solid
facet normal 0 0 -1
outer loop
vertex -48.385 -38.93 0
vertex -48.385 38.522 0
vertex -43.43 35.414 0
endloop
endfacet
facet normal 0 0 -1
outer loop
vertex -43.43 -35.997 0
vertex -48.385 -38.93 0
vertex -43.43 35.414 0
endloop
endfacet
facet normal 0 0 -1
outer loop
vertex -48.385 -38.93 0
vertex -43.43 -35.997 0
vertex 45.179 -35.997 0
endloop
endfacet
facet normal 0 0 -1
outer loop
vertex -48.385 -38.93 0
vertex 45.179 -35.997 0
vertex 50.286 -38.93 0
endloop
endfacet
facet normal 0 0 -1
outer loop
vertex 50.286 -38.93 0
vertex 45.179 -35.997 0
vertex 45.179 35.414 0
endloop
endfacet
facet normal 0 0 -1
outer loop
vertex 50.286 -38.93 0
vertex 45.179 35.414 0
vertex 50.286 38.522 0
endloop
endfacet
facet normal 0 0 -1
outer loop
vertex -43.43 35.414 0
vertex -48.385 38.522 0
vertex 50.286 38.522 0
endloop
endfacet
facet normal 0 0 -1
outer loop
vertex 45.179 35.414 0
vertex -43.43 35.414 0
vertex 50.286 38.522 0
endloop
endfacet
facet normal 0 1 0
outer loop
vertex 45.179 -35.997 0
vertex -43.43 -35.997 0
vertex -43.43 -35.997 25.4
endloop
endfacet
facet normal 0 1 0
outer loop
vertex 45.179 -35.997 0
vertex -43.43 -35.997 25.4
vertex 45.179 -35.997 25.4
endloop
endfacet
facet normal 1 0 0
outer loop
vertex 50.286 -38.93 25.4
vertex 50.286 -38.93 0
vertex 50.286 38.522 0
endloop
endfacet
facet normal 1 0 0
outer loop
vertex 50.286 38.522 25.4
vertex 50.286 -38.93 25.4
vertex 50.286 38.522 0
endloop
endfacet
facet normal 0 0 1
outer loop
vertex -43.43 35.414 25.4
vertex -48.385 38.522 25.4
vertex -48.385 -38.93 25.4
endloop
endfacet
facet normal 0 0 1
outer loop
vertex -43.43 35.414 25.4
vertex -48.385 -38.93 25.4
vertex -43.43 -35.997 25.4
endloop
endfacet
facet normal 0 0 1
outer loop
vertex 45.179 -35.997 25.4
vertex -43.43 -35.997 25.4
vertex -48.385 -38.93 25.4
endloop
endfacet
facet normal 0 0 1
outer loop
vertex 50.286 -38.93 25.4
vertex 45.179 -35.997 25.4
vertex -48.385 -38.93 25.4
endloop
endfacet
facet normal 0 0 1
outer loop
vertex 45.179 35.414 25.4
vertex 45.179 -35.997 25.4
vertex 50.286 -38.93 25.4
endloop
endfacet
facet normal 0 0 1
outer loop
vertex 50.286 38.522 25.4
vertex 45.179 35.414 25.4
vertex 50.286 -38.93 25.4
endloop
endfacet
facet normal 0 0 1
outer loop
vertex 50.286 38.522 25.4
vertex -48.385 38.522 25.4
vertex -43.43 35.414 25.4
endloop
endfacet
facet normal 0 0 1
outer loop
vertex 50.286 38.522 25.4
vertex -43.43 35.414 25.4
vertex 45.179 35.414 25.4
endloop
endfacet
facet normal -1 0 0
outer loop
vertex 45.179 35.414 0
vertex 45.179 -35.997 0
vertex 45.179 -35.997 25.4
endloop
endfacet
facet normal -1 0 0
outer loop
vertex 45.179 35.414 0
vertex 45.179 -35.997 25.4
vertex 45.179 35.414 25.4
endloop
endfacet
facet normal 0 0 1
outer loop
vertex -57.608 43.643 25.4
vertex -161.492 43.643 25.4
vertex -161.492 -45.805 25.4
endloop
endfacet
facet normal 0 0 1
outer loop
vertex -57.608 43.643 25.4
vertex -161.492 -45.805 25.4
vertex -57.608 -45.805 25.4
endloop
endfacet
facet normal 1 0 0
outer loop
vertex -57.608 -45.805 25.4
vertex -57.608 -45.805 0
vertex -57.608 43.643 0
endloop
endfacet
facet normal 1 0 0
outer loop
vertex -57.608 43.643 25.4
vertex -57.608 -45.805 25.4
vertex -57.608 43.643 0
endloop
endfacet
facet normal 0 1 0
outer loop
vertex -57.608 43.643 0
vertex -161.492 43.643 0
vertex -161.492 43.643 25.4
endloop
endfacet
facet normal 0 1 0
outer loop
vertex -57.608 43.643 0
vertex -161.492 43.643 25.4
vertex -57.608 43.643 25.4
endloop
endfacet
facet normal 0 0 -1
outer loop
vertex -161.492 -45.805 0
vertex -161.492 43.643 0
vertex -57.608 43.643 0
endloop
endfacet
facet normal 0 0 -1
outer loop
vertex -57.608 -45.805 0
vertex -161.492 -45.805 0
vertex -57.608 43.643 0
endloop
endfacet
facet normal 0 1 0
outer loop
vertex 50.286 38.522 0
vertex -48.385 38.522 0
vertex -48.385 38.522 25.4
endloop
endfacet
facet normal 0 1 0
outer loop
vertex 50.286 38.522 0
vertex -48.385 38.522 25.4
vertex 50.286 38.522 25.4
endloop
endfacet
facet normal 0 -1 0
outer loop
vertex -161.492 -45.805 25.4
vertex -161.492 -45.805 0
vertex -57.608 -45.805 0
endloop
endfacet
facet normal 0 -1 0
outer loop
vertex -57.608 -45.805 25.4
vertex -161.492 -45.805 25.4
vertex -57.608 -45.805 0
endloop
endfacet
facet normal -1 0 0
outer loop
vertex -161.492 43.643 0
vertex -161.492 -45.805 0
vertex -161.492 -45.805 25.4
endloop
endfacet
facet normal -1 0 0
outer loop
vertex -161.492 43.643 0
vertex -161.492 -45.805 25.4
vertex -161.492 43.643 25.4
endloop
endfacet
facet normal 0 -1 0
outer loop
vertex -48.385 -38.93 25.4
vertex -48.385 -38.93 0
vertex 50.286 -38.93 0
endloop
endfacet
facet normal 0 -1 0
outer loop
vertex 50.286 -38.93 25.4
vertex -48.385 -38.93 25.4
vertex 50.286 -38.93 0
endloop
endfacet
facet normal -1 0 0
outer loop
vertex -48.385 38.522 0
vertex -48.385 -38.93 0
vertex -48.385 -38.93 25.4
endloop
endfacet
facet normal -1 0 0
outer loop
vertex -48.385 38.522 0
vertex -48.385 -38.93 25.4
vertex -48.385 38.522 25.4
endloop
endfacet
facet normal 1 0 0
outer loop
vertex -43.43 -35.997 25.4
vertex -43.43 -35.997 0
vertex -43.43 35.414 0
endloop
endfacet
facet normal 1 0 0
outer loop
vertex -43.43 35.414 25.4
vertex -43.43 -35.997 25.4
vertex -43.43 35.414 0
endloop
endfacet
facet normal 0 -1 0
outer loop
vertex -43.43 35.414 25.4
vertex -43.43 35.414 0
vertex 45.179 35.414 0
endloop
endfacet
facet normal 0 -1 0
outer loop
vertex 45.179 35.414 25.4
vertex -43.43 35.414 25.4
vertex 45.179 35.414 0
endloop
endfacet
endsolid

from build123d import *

# Parameters (mm, degrees)
F0_W     = 98.671046
F0_H     = 77.452082
F0_W_2   = 88.608526
F0_H_2   = 71.411476
F1_DEPTH = 25.4
F2_W     = 103.88444
F2_H     = 89.447331
F3_DEPTH = 25.4


with BuildPart() as f1:
    # F0 (on Top) → F1 (new body)
    with BuildSketch(Plane.XY):
        with Locations((0.950126, -0.204144)):
            Rectangle(F0_W, F0_H)
        with Locations((0.874426, -0.291474)):
            Rectangle(F0_W_2, F0_H_2, mode=Mode.SUBTRACT)
    extrude(amount=F1_DEPTH)


with BuildPart() as f3:
    # F2 (on Top) → F3 (new body)
    with BuildSketch(Plane.XY):
        with Locations((-109.550068, -1.080951)):
            Rectangle(F2_W, F2_H)
    extrude(amount=F3_DEPTH)


solid = Compound([f1.part, f3.part])
